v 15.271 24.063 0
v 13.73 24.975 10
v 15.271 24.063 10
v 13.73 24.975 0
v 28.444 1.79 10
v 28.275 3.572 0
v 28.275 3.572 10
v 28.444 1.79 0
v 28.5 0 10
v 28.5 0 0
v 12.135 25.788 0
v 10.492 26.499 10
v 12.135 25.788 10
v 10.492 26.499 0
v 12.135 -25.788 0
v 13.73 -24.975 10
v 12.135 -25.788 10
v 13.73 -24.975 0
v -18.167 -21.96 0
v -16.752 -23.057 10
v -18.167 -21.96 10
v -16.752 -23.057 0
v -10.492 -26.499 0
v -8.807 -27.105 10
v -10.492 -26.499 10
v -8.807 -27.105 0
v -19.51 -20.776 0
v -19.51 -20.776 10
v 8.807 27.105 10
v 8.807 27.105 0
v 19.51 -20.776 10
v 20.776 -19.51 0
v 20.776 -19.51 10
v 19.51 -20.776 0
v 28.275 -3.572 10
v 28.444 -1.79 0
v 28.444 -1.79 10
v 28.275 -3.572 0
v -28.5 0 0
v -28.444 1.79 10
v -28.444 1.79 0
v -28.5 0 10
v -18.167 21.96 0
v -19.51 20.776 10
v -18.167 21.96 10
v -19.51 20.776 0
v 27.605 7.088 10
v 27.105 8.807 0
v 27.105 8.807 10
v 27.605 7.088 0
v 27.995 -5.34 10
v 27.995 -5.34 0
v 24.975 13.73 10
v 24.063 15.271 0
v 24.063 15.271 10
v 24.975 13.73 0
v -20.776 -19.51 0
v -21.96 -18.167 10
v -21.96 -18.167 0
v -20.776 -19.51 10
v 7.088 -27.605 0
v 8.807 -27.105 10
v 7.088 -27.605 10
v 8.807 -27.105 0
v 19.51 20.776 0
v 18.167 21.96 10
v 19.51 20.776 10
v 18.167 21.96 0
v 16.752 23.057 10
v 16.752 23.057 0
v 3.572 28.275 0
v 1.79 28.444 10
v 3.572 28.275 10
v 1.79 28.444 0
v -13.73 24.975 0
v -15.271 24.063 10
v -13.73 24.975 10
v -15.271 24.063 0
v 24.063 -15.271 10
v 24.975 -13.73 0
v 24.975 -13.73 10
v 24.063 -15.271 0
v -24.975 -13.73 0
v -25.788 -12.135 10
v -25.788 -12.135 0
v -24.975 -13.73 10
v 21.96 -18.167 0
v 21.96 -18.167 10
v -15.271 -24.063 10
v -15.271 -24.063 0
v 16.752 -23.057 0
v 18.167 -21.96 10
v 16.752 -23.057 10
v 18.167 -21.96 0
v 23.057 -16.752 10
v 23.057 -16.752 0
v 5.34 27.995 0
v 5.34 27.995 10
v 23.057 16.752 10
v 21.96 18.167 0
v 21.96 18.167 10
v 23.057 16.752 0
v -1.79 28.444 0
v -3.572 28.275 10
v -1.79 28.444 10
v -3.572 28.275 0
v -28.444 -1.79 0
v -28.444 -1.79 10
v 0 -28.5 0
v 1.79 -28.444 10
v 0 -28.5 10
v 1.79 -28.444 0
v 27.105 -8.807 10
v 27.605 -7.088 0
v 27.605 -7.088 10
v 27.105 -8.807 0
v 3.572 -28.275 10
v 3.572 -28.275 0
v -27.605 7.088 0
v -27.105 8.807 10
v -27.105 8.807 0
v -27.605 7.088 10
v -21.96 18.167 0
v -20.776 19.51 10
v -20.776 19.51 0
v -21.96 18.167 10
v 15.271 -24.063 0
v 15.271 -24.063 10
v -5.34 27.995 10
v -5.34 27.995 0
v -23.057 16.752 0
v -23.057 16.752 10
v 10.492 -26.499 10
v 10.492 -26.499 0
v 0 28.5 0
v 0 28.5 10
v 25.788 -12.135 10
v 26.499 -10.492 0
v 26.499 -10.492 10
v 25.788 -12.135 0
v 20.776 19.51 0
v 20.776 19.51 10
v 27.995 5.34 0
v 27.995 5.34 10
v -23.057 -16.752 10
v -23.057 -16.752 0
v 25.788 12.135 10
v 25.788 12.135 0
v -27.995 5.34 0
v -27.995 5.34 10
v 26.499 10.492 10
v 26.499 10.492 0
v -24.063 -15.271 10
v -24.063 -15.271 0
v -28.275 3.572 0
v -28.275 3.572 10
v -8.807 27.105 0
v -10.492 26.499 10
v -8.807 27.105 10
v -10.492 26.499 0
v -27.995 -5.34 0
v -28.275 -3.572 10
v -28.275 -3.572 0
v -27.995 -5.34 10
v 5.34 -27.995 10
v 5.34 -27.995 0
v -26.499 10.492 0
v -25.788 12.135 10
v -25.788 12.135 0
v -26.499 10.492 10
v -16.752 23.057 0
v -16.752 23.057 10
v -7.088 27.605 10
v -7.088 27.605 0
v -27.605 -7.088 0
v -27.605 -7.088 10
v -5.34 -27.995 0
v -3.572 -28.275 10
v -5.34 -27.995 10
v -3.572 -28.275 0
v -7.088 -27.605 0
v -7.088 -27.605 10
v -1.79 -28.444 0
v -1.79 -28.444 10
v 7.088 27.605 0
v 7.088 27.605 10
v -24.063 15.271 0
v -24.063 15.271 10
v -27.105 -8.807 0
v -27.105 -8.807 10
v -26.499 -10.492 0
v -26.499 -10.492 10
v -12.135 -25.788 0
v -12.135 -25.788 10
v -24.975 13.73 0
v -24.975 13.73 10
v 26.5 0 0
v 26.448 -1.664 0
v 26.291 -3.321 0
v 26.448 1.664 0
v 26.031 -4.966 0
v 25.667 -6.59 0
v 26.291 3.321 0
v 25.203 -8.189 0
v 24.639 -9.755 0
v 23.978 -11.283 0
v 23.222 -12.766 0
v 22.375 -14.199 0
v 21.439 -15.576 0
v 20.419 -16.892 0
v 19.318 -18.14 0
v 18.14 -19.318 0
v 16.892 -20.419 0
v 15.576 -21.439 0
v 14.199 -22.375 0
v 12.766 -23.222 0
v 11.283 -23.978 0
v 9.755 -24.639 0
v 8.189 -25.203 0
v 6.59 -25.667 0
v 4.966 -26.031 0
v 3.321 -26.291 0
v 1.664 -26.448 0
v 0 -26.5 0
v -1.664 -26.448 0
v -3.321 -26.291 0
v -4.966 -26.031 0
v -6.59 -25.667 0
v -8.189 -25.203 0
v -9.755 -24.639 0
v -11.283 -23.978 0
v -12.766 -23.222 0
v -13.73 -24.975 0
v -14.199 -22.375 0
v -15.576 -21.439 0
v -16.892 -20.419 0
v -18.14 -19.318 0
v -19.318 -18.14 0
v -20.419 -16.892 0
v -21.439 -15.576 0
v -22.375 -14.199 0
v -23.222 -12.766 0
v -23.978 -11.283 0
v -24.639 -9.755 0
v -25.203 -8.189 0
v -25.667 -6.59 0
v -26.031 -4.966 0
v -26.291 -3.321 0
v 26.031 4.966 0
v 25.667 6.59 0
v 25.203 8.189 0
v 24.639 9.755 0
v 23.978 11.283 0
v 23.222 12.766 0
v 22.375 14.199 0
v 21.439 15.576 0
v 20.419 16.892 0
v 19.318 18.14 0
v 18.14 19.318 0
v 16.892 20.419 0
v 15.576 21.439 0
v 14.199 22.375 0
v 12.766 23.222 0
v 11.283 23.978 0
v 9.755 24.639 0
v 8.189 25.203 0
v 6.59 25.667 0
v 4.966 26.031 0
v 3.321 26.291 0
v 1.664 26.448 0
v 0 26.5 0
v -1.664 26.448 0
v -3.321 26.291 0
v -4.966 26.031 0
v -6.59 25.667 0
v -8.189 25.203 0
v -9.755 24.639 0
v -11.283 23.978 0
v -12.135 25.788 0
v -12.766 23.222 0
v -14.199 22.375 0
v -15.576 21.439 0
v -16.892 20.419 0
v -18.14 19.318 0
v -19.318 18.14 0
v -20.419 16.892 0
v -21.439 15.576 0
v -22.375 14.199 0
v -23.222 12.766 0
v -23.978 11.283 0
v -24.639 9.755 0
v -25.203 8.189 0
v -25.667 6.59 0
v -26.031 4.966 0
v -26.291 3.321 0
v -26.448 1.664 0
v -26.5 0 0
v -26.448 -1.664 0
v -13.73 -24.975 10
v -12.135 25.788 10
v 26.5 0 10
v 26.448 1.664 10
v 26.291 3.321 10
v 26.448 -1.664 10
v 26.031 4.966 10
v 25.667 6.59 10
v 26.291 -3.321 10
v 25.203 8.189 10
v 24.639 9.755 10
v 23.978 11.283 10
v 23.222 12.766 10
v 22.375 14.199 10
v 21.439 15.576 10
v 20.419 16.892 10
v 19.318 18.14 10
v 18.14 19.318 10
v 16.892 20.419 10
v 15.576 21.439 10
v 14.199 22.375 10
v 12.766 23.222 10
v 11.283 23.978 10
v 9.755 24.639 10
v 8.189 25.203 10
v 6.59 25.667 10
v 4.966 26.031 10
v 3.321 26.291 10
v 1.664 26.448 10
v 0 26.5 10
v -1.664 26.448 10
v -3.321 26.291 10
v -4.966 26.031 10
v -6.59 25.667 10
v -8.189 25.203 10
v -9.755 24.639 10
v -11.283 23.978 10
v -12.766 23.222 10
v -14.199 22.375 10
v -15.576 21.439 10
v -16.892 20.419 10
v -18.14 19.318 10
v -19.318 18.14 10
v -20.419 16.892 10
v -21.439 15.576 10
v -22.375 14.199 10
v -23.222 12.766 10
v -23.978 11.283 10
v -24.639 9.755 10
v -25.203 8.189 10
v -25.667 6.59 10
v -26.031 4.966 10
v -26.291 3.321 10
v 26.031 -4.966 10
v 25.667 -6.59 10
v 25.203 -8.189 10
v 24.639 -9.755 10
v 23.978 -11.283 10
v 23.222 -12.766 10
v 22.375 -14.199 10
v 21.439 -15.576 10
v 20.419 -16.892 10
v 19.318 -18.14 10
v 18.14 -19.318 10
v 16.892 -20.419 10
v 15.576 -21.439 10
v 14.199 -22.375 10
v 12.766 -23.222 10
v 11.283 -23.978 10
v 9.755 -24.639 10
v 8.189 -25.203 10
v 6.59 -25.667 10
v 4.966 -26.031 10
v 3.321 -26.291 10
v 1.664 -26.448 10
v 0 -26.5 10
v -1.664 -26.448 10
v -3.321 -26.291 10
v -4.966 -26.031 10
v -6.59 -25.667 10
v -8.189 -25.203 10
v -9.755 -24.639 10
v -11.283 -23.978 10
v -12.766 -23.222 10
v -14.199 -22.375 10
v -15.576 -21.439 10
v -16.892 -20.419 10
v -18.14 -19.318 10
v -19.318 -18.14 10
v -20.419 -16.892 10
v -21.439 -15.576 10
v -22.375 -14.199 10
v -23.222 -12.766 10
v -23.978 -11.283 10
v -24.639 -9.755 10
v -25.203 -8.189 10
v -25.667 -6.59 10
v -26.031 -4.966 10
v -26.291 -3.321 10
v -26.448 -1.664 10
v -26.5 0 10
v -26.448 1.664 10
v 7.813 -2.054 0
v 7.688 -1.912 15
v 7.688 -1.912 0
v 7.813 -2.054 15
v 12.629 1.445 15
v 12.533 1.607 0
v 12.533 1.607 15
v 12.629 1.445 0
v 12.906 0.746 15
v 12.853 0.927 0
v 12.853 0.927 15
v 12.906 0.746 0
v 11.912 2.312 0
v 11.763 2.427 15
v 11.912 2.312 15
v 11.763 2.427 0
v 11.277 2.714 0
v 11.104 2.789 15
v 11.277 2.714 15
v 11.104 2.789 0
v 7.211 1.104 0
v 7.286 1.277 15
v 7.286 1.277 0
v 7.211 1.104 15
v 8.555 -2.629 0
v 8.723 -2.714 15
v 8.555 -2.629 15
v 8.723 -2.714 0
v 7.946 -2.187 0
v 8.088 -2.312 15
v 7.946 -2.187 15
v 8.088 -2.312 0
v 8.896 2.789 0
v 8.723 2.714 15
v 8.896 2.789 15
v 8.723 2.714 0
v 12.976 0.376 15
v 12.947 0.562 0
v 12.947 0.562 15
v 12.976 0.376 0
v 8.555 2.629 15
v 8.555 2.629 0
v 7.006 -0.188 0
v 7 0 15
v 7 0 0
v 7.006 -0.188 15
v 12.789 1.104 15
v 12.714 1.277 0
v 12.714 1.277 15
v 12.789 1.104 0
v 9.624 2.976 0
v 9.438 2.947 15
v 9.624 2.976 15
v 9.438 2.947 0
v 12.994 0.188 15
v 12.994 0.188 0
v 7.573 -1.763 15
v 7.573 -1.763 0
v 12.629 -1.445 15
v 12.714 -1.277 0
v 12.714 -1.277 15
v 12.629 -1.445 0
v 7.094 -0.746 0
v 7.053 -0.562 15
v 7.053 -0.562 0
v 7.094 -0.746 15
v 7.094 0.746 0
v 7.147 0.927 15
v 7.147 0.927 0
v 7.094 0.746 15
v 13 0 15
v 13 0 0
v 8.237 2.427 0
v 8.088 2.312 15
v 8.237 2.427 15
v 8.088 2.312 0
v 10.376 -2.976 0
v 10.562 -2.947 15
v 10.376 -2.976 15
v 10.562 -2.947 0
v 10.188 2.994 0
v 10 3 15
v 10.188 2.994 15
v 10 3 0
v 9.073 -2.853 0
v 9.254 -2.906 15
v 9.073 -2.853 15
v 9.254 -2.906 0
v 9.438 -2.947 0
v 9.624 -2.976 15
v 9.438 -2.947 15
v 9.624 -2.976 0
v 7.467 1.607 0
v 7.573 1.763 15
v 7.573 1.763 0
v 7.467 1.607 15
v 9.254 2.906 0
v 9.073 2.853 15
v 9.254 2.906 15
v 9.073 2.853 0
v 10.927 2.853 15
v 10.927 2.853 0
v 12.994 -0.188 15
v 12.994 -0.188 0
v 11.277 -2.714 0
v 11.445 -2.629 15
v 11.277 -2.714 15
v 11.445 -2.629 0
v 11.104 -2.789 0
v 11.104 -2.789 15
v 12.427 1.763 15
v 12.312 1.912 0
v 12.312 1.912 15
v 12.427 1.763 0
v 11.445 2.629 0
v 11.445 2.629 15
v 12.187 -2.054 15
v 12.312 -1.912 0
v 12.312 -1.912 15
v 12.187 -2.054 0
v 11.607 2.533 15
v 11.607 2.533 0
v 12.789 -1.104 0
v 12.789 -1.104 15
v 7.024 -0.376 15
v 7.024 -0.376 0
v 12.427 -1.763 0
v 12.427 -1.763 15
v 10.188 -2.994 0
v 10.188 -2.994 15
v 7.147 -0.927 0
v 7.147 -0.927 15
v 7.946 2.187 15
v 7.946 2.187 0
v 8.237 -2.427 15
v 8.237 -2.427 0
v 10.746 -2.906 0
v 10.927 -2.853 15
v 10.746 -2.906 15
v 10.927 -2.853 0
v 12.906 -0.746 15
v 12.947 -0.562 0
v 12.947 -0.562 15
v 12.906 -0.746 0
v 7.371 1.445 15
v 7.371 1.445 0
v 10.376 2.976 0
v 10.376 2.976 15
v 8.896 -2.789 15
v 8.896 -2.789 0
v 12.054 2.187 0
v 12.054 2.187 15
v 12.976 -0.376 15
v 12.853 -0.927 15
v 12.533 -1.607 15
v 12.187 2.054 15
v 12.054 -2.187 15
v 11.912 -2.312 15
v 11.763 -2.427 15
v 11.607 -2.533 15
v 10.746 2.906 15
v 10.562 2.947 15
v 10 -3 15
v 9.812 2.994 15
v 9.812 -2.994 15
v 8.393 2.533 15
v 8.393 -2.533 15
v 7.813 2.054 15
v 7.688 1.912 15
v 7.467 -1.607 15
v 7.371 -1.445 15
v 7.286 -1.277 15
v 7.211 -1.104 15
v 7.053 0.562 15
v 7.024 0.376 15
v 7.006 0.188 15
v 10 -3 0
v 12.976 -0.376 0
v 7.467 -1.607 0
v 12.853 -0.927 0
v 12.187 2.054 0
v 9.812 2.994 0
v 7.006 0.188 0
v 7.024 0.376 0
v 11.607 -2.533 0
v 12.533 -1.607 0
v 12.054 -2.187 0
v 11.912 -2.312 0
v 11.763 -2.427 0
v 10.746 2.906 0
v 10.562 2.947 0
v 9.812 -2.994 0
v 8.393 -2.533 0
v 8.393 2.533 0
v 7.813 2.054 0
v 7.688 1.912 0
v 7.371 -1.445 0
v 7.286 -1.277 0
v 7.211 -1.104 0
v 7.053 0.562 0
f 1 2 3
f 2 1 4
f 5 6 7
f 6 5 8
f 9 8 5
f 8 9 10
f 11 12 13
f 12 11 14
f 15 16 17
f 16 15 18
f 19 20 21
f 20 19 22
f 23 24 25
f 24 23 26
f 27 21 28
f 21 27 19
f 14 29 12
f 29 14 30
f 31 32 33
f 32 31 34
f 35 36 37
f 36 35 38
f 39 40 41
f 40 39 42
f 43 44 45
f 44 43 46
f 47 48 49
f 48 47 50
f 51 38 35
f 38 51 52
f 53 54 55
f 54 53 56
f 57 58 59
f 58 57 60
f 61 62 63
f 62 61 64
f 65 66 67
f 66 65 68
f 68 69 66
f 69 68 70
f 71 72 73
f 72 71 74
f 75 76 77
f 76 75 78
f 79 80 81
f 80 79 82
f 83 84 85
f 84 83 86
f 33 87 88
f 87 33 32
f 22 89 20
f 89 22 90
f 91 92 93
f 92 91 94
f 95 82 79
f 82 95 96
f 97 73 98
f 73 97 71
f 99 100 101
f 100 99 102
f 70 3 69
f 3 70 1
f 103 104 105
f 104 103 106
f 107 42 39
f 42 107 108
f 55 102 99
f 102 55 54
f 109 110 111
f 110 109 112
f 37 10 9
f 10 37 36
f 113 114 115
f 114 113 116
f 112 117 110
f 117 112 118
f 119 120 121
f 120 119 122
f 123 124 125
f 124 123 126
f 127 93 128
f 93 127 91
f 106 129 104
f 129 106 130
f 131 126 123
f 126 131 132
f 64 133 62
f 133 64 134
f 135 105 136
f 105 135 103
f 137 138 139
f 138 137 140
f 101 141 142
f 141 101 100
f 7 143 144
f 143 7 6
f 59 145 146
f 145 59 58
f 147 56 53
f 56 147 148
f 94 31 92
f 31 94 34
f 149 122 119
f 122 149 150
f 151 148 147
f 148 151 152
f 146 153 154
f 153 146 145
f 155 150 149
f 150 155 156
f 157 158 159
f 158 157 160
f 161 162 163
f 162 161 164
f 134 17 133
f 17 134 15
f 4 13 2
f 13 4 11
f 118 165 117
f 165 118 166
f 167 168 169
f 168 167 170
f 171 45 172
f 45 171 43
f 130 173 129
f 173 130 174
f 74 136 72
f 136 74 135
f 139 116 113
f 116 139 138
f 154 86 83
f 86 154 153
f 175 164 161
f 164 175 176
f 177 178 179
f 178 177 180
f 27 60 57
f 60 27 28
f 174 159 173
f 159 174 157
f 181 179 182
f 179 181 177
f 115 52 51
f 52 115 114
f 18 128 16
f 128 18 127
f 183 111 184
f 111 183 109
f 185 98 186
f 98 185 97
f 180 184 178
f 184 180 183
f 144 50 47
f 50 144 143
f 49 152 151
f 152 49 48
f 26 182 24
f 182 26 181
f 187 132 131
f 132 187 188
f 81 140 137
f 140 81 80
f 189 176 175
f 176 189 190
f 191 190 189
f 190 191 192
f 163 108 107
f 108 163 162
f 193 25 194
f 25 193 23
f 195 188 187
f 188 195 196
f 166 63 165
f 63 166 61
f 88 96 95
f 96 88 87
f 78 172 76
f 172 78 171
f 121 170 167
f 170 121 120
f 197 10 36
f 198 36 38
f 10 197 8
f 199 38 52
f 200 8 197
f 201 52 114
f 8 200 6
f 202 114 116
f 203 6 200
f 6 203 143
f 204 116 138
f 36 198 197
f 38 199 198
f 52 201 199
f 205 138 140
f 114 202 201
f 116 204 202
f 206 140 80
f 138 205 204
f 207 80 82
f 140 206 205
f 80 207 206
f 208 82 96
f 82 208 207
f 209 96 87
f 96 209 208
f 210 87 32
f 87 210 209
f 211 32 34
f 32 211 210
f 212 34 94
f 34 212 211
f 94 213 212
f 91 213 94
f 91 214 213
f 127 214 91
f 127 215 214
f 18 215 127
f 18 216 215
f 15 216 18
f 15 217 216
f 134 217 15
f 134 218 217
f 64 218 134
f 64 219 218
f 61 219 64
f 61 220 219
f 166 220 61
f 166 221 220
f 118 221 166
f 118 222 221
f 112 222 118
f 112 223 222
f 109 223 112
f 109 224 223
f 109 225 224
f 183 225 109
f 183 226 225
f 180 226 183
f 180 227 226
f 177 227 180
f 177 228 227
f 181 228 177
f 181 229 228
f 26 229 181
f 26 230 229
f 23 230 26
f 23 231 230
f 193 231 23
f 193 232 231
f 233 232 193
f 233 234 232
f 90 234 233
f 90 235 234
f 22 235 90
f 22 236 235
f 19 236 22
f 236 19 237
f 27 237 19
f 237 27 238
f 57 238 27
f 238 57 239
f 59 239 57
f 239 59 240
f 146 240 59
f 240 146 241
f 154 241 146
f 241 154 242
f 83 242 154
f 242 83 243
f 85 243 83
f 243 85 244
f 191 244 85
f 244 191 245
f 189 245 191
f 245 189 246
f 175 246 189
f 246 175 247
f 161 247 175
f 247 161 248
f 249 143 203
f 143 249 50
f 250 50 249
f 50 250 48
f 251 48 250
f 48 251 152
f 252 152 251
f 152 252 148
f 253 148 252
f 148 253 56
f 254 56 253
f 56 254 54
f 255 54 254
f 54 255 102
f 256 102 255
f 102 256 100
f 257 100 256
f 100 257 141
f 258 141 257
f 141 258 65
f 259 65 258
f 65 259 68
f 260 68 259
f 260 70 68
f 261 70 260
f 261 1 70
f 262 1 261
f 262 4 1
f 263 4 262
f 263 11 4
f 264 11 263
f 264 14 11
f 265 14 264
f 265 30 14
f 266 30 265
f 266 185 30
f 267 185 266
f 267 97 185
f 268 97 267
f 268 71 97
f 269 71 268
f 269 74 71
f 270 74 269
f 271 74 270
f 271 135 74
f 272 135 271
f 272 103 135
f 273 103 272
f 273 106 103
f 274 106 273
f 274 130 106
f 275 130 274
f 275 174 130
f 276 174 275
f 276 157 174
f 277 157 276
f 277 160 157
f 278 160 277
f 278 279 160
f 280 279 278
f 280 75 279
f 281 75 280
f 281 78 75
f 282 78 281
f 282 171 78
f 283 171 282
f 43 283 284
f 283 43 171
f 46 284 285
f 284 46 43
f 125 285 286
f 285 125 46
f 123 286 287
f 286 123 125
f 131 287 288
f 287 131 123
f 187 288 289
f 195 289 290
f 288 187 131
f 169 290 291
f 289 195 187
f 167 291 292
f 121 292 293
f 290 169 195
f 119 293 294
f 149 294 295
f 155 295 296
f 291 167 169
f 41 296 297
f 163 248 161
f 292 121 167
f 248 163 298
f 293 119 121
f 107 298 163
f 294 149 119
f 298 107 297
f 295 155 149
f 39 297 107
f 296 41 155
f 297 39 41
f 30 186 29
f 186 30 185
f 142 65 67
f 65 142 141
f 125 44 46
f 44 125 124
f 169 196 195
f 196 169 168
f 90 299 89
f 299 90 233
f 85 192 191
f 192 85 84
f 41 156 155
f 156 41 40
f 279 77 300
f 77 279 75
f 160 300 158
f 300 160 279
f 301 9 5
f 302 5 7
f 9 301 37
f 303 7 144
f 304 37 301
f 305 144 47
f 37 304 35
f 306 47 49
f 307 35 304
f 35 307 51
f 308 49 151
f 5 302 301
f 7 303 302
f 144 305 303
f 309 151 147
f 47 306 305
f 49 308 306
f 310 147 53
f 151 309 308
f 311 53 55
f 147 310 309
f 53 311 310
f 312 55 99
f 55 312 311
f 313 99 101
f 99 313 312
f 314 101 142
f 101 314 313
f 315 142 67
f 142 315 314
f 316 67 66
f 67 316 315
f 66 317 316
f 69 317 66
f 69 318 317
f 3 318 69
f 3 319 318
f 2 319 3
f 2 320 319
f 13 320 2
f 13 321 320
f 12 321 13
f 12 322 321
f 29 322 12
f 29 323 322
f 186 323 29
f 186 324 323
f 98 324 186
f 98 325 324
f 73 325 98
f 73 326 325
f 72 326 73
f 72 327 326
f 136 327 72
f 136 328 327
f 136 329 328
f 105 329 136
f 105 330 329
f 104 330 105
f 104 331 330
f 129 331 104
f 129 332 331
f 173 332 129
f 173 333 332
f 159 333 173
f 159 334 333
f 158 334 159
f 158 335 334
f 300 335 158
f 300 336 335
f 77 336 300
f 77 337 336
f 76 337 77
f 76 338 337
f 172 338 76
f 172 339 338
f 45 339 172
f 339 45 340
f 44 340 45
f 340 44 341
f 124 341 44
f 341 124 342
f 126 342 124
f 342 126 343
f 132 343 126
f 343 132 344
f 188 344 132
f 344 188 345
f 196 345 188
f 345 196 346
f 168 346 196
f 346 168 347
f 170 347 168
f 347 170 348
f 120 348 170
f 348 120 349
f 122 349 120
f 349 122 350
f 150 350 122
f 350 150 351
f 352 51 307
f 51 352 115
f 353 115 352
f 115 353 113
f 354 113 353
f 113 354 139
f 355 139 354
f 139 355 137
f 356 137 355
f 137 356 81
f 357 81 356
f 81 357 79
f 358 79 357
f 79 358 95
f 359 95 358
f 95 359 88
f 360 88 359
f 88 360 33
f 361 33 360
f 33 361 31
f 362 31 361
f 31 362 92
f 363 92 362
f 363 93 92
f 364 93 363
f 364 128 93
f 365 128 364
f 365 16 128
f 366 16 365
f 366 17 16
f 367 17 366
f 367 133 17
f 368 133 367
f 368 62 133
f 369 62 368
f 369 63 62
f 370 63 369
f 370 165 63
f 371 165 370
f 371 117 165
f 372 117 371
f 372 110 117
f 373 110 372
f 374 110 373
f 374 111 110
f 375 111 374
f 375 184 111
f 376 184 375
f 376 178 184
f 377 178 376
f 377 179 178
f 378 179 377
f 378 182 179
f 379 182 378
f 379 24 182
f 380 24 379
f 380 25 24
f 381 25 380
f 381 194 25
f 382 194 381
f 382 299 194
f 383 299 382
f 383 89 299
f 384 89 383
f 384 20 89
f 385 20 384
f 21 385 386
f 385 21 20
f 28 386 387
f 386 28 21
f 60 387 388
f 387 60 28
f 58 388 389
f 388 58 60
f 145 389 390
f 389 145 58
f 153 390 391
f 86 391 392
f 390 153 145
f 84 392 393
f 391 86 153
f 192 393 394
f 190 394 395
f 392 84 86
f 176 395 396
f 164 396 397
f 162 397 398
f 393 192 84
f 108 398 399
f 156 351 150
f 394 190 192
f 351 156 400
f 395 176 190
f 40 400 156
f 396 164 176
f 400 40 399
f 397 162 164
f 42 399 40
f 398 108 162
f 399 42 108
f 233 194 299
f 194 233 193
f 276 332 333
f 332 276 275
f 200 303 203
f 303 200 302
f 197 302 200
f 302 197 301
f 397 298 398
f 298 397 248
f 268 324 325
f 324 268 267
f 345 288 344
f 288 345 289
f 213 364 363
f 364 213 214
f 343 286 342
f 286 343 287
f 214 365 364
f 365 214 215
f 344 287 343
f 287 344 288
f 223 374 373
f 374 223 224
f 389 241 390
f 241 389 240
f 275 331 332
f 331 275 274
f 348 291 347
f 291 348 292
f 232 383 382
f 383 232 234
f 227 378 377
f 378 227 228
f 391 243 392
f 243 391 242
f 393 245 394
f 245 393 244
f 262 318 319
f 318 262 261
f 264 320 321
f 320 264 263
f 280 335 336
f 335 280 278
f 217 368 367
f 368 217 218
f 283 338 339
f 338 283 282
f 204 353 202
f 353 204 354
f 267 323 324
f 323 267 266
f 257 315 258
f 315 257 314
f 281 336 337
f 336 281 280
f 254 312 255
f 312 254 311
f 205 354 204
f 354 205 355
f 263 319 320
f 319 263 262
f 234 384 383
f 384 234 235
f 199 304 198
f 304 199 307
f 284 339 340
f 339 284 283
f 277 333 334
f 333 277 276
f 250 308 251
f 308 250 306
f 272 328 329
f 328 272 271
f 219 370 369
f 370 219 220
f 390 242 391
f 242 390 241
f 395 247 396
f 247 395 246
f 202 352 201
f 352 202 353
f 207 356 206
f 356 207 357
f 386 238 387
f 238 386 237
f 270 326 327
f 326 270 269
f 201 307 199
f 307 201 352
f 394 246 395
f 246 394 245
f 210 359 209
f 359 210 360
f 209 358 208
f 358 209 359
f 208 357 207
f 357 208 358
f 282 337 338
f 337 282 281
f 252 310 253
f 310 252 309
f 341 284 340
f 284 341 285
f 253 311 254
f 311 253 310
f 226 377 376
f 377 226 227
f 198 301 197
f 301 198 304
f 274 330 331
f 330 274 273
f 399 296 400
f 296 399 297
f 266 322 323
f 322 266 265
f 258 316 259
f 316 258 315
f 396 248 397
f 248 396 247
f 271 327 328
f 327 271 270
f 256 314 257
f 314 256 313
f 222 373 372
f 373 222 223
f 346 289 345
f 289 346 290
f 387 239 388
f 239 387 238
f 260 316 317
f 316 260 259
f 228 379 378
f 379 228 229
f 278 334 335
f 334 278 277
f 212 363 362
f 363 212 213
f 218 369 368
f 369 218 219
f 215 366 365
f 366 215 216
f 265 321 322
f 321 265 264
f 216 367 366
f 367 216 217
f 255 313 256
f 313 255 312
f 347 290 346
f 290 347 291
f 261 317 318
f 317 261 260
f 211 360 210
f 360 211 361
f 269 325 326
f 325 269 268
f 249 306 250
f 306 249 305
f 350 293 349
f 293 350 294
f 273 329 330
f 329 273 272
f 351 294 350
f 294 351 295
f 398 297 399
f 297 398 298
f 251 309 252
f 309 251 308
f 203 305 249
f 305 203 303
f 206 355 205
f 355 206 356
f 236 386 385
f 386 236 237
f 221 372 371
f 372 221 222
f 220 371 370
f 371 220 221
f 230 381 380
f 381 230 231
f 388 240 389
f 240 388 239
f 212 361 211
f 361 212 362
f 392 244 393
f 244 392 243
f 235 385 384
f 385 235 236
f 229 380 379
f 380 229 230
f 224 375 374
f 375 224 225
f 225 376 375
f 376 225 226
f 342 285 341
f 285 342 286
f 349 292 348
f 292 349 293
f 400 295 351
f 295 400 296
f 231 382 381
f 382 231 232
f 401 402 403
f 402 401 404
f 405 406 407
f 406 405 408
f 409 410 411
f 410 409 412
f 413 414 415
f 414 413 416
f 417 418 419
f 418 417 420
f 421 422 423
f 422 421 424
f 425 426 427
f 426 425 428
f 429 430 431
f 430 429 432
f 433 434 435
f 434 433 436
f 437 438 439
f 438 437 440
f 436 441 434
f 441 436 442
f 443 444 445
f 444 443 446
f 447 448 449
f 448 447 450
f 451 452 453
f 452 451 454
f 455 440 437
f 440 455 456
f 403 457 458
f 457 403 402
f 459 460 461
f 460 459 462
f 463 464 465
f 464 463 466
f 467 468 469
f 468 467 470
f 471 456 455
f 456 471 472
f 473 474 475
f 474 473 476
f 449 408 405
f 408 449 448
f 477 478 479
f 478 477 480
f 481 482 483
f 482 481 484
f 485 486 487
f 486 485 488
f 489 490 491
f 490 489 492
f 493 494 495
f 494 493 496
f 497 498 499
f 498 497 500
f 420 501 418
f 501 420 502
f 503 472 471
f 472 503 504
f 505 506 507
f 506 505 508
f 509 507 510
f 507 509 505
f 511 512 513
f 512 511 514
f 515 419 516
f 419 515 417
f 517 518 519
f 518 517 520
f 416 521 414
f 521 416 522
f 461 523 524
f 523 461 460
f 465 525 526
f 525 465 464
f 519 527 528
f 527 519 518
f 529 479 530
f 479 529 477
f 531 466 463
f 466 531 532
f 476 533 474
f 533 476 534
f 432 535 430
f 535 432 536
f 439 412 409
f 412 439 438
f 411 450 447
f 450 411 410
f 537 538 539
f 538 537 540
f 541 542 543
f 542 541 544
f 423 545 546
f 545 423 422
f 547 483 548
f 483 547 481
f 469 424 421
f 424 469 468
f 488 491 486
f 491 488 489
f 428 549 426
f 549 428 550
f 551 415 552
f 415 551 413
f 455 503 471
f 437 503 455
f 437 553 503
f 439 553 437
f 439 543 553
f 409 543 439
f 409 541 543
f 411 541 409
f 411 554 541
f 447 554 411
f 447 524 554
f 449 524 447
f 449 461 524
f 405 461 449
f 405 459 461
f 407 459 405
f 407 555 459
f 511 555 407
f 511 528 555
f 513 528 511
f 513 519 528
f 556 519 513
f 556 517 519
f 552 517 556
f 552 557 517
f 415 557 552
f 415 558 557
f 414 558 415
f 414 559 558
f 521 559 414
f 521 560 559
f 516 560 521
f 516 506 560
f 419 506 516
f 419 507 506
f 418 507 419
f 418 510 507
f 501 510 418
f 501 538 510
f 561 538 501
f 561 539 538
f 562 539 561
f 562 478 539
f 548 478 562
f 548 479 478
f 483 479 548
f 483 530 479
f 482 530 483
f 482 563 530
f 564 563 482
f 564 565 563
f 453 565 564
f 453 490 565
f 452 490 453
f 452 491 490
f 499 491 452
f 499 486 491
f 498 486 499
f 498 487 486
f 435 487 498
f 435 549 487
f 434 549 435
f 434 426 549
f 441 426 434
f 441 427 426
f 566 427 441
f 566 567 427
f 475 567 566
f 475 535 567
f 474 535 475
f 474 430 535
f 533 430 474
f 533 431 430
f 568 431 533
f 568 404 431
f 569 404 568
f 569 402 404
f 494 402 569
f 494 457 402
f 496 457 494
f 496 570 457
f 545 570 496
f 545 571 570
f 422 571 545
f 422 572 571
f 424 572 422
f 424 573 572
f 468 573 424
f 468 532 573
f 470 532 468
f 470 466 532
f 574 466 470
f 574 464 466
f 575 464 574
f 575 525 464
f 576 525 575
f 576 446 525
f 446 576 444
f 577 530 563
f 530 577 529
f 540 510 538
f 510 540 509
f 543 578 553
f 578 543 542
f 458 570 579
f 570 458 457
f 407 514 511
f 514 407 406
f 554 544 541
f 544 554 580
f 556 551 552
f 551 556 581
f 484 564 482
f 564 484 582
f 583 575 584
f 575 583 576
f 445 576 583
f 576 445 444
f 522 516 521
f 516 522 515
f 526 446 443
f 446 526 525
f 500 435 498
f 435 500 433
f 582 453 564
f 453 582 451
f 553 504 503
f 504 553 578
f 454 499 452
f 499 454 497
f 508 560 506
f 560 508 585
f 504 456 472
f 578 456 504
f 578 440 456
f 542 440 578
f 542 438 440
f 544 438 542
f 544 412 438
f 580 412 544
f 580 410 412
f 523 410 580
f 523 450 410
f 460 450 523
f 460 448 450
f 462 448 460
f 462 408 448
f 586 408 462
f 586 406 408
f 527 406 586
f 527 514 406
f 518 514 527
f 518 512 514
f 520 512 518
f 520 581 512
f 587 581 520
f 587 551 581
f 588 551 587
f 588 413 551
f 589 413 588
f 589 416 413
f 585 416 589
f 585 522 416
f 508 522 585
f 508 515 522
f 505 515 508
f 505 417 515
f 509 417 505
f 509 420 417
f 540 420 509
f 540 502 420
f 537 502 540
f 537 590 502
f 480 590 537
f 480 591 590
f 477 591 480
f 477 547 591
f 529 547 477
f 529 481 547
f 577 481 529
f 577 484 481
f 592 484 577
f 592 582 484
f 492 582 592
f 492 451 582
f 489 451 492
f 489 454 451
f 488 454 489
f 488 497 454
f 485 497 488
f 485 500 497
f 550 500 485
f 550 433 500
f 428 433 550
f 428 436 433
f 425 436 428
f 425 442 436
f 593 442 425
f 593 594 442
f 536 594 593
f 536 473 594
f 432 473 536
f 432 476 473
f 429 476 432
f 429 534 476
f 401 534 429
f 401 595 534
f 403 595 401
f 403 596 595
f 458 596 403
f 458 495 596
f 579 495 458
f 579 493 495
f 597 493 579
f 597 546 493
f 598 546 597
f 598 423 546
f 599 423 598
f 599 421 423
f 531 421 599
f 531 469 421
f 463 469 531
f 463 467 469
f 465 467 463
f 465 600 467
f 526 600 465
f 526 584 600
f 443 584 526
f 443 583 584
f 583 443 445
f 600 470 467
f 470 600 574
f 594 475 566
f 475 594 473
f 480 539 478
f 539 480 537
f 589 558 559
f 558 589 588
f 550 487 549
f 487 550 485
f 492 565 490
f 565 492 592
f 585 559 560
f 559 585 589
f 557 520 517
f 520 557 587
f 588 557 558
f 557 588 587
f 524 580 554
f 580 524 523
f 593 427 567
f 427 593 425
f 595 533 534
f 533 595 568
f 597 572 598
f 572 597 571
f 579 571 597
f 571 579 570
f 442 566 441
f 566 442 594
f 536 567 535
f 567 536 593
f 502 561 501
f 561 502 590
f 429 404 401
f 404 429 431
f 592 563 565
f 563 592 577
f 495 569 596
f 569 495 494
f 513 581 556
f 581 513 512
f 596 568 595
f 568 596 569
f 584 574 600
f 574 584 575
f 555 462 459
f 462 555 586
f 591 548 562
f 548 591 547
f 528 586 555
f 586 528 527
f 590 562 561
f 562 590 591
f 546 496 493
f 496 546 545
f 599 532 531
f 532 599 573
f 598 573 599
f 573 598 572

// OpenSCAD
$fn = 100; // Set the number of facets for smooth curves

// Dimensions
cap_outer_diameter = 57;
cap_wall_thickness = 2;
cap_height = 10;
hole_diameter = 3;

pipe_length = 15;
pipe_outer_diameter = 6;
pipe_displacement = 10; // Displacement of the pipe from the cap center
pipe_top_length = 20;
pipe_wall_thickness = 2;

// Cap
difference() {
    cylinder(d = cap_outer_diameter, h = cap_height);
    translate([0, 0, -1]) { // Subtract a small amount to avoid interference with the pipe
        cylinder(d = cap_outer_diameter - 2 * cap_wall_thickness, h = cap_height + 2);
    }
    translate([0, 0, cap_height/2]) { // Create a hole in the middle of the cap
        cylinder(d = hole_diameter, h = cap_height + 2);
    }
    translate([0, 0, cap_height]) { // Create the upper part of the cap
        cylinder(d1 = cap_outer_diameter, d2 = cap_outer_diameter - 2 * cap_wall_thickness, h = cap_wall_thickness);
    }
}

// Sucking Pipe
difference() {
    translate([pipe_displacement, 0, 0]) { // Displace the pipe from the cap center
        cylinder(d = pipe_outer_diameter, h = pipe_length);
    }
    translate([pipe_displacement, 0, pipe_length]) { // Create a top part of the pipe
        cylinder(d = pipe_outer_diameter, h = pipe_top_length);
    }
    translate([pipe_displacement, 0, pipe_length + pipe_top_length]) { // Hollow out the top part of the pipe
        cylinder(d = pipe_outer_diameter - 2 * pipe_wall_thickness, h = pipe_wall_thickness);
    }
}
